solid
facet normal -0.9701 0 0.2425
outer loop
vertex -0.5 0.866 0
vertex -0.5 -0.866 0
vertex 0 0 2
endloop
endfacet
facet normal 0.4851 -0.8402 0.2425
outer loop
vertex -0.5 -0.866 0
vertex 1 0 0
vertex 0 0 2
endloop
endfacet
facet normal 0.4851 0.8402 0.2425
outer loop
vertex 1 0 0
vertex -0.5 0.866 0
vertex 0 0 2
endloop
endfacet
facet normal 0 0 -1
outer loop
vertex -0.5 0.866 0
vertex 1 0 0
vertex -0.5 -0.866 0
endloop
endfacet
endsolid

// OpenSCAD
// Define vertices of the regular tetrahedron
vertices = [
    [ 0,  0,  2],  // Vertex 0
    [-cos(60)*1,  -sin(60)*1, 0],  // Vertex 1
    [-cos(60)*1,  sin(60)*1, 0],  // Vertex 2
    [ 1,  0, 0]   // Vertex 3
];

// Define faces using the vertices
faces = [
    [0, 1, 2], // Face 1
    [0, 3, 1], // Face 2
    [0, 2, 3], // Face 3
    [1, 3, 2]  // Face 4
];



// Create the regular tetrahedron
polyhedron(points = vertices, faces = faces);
